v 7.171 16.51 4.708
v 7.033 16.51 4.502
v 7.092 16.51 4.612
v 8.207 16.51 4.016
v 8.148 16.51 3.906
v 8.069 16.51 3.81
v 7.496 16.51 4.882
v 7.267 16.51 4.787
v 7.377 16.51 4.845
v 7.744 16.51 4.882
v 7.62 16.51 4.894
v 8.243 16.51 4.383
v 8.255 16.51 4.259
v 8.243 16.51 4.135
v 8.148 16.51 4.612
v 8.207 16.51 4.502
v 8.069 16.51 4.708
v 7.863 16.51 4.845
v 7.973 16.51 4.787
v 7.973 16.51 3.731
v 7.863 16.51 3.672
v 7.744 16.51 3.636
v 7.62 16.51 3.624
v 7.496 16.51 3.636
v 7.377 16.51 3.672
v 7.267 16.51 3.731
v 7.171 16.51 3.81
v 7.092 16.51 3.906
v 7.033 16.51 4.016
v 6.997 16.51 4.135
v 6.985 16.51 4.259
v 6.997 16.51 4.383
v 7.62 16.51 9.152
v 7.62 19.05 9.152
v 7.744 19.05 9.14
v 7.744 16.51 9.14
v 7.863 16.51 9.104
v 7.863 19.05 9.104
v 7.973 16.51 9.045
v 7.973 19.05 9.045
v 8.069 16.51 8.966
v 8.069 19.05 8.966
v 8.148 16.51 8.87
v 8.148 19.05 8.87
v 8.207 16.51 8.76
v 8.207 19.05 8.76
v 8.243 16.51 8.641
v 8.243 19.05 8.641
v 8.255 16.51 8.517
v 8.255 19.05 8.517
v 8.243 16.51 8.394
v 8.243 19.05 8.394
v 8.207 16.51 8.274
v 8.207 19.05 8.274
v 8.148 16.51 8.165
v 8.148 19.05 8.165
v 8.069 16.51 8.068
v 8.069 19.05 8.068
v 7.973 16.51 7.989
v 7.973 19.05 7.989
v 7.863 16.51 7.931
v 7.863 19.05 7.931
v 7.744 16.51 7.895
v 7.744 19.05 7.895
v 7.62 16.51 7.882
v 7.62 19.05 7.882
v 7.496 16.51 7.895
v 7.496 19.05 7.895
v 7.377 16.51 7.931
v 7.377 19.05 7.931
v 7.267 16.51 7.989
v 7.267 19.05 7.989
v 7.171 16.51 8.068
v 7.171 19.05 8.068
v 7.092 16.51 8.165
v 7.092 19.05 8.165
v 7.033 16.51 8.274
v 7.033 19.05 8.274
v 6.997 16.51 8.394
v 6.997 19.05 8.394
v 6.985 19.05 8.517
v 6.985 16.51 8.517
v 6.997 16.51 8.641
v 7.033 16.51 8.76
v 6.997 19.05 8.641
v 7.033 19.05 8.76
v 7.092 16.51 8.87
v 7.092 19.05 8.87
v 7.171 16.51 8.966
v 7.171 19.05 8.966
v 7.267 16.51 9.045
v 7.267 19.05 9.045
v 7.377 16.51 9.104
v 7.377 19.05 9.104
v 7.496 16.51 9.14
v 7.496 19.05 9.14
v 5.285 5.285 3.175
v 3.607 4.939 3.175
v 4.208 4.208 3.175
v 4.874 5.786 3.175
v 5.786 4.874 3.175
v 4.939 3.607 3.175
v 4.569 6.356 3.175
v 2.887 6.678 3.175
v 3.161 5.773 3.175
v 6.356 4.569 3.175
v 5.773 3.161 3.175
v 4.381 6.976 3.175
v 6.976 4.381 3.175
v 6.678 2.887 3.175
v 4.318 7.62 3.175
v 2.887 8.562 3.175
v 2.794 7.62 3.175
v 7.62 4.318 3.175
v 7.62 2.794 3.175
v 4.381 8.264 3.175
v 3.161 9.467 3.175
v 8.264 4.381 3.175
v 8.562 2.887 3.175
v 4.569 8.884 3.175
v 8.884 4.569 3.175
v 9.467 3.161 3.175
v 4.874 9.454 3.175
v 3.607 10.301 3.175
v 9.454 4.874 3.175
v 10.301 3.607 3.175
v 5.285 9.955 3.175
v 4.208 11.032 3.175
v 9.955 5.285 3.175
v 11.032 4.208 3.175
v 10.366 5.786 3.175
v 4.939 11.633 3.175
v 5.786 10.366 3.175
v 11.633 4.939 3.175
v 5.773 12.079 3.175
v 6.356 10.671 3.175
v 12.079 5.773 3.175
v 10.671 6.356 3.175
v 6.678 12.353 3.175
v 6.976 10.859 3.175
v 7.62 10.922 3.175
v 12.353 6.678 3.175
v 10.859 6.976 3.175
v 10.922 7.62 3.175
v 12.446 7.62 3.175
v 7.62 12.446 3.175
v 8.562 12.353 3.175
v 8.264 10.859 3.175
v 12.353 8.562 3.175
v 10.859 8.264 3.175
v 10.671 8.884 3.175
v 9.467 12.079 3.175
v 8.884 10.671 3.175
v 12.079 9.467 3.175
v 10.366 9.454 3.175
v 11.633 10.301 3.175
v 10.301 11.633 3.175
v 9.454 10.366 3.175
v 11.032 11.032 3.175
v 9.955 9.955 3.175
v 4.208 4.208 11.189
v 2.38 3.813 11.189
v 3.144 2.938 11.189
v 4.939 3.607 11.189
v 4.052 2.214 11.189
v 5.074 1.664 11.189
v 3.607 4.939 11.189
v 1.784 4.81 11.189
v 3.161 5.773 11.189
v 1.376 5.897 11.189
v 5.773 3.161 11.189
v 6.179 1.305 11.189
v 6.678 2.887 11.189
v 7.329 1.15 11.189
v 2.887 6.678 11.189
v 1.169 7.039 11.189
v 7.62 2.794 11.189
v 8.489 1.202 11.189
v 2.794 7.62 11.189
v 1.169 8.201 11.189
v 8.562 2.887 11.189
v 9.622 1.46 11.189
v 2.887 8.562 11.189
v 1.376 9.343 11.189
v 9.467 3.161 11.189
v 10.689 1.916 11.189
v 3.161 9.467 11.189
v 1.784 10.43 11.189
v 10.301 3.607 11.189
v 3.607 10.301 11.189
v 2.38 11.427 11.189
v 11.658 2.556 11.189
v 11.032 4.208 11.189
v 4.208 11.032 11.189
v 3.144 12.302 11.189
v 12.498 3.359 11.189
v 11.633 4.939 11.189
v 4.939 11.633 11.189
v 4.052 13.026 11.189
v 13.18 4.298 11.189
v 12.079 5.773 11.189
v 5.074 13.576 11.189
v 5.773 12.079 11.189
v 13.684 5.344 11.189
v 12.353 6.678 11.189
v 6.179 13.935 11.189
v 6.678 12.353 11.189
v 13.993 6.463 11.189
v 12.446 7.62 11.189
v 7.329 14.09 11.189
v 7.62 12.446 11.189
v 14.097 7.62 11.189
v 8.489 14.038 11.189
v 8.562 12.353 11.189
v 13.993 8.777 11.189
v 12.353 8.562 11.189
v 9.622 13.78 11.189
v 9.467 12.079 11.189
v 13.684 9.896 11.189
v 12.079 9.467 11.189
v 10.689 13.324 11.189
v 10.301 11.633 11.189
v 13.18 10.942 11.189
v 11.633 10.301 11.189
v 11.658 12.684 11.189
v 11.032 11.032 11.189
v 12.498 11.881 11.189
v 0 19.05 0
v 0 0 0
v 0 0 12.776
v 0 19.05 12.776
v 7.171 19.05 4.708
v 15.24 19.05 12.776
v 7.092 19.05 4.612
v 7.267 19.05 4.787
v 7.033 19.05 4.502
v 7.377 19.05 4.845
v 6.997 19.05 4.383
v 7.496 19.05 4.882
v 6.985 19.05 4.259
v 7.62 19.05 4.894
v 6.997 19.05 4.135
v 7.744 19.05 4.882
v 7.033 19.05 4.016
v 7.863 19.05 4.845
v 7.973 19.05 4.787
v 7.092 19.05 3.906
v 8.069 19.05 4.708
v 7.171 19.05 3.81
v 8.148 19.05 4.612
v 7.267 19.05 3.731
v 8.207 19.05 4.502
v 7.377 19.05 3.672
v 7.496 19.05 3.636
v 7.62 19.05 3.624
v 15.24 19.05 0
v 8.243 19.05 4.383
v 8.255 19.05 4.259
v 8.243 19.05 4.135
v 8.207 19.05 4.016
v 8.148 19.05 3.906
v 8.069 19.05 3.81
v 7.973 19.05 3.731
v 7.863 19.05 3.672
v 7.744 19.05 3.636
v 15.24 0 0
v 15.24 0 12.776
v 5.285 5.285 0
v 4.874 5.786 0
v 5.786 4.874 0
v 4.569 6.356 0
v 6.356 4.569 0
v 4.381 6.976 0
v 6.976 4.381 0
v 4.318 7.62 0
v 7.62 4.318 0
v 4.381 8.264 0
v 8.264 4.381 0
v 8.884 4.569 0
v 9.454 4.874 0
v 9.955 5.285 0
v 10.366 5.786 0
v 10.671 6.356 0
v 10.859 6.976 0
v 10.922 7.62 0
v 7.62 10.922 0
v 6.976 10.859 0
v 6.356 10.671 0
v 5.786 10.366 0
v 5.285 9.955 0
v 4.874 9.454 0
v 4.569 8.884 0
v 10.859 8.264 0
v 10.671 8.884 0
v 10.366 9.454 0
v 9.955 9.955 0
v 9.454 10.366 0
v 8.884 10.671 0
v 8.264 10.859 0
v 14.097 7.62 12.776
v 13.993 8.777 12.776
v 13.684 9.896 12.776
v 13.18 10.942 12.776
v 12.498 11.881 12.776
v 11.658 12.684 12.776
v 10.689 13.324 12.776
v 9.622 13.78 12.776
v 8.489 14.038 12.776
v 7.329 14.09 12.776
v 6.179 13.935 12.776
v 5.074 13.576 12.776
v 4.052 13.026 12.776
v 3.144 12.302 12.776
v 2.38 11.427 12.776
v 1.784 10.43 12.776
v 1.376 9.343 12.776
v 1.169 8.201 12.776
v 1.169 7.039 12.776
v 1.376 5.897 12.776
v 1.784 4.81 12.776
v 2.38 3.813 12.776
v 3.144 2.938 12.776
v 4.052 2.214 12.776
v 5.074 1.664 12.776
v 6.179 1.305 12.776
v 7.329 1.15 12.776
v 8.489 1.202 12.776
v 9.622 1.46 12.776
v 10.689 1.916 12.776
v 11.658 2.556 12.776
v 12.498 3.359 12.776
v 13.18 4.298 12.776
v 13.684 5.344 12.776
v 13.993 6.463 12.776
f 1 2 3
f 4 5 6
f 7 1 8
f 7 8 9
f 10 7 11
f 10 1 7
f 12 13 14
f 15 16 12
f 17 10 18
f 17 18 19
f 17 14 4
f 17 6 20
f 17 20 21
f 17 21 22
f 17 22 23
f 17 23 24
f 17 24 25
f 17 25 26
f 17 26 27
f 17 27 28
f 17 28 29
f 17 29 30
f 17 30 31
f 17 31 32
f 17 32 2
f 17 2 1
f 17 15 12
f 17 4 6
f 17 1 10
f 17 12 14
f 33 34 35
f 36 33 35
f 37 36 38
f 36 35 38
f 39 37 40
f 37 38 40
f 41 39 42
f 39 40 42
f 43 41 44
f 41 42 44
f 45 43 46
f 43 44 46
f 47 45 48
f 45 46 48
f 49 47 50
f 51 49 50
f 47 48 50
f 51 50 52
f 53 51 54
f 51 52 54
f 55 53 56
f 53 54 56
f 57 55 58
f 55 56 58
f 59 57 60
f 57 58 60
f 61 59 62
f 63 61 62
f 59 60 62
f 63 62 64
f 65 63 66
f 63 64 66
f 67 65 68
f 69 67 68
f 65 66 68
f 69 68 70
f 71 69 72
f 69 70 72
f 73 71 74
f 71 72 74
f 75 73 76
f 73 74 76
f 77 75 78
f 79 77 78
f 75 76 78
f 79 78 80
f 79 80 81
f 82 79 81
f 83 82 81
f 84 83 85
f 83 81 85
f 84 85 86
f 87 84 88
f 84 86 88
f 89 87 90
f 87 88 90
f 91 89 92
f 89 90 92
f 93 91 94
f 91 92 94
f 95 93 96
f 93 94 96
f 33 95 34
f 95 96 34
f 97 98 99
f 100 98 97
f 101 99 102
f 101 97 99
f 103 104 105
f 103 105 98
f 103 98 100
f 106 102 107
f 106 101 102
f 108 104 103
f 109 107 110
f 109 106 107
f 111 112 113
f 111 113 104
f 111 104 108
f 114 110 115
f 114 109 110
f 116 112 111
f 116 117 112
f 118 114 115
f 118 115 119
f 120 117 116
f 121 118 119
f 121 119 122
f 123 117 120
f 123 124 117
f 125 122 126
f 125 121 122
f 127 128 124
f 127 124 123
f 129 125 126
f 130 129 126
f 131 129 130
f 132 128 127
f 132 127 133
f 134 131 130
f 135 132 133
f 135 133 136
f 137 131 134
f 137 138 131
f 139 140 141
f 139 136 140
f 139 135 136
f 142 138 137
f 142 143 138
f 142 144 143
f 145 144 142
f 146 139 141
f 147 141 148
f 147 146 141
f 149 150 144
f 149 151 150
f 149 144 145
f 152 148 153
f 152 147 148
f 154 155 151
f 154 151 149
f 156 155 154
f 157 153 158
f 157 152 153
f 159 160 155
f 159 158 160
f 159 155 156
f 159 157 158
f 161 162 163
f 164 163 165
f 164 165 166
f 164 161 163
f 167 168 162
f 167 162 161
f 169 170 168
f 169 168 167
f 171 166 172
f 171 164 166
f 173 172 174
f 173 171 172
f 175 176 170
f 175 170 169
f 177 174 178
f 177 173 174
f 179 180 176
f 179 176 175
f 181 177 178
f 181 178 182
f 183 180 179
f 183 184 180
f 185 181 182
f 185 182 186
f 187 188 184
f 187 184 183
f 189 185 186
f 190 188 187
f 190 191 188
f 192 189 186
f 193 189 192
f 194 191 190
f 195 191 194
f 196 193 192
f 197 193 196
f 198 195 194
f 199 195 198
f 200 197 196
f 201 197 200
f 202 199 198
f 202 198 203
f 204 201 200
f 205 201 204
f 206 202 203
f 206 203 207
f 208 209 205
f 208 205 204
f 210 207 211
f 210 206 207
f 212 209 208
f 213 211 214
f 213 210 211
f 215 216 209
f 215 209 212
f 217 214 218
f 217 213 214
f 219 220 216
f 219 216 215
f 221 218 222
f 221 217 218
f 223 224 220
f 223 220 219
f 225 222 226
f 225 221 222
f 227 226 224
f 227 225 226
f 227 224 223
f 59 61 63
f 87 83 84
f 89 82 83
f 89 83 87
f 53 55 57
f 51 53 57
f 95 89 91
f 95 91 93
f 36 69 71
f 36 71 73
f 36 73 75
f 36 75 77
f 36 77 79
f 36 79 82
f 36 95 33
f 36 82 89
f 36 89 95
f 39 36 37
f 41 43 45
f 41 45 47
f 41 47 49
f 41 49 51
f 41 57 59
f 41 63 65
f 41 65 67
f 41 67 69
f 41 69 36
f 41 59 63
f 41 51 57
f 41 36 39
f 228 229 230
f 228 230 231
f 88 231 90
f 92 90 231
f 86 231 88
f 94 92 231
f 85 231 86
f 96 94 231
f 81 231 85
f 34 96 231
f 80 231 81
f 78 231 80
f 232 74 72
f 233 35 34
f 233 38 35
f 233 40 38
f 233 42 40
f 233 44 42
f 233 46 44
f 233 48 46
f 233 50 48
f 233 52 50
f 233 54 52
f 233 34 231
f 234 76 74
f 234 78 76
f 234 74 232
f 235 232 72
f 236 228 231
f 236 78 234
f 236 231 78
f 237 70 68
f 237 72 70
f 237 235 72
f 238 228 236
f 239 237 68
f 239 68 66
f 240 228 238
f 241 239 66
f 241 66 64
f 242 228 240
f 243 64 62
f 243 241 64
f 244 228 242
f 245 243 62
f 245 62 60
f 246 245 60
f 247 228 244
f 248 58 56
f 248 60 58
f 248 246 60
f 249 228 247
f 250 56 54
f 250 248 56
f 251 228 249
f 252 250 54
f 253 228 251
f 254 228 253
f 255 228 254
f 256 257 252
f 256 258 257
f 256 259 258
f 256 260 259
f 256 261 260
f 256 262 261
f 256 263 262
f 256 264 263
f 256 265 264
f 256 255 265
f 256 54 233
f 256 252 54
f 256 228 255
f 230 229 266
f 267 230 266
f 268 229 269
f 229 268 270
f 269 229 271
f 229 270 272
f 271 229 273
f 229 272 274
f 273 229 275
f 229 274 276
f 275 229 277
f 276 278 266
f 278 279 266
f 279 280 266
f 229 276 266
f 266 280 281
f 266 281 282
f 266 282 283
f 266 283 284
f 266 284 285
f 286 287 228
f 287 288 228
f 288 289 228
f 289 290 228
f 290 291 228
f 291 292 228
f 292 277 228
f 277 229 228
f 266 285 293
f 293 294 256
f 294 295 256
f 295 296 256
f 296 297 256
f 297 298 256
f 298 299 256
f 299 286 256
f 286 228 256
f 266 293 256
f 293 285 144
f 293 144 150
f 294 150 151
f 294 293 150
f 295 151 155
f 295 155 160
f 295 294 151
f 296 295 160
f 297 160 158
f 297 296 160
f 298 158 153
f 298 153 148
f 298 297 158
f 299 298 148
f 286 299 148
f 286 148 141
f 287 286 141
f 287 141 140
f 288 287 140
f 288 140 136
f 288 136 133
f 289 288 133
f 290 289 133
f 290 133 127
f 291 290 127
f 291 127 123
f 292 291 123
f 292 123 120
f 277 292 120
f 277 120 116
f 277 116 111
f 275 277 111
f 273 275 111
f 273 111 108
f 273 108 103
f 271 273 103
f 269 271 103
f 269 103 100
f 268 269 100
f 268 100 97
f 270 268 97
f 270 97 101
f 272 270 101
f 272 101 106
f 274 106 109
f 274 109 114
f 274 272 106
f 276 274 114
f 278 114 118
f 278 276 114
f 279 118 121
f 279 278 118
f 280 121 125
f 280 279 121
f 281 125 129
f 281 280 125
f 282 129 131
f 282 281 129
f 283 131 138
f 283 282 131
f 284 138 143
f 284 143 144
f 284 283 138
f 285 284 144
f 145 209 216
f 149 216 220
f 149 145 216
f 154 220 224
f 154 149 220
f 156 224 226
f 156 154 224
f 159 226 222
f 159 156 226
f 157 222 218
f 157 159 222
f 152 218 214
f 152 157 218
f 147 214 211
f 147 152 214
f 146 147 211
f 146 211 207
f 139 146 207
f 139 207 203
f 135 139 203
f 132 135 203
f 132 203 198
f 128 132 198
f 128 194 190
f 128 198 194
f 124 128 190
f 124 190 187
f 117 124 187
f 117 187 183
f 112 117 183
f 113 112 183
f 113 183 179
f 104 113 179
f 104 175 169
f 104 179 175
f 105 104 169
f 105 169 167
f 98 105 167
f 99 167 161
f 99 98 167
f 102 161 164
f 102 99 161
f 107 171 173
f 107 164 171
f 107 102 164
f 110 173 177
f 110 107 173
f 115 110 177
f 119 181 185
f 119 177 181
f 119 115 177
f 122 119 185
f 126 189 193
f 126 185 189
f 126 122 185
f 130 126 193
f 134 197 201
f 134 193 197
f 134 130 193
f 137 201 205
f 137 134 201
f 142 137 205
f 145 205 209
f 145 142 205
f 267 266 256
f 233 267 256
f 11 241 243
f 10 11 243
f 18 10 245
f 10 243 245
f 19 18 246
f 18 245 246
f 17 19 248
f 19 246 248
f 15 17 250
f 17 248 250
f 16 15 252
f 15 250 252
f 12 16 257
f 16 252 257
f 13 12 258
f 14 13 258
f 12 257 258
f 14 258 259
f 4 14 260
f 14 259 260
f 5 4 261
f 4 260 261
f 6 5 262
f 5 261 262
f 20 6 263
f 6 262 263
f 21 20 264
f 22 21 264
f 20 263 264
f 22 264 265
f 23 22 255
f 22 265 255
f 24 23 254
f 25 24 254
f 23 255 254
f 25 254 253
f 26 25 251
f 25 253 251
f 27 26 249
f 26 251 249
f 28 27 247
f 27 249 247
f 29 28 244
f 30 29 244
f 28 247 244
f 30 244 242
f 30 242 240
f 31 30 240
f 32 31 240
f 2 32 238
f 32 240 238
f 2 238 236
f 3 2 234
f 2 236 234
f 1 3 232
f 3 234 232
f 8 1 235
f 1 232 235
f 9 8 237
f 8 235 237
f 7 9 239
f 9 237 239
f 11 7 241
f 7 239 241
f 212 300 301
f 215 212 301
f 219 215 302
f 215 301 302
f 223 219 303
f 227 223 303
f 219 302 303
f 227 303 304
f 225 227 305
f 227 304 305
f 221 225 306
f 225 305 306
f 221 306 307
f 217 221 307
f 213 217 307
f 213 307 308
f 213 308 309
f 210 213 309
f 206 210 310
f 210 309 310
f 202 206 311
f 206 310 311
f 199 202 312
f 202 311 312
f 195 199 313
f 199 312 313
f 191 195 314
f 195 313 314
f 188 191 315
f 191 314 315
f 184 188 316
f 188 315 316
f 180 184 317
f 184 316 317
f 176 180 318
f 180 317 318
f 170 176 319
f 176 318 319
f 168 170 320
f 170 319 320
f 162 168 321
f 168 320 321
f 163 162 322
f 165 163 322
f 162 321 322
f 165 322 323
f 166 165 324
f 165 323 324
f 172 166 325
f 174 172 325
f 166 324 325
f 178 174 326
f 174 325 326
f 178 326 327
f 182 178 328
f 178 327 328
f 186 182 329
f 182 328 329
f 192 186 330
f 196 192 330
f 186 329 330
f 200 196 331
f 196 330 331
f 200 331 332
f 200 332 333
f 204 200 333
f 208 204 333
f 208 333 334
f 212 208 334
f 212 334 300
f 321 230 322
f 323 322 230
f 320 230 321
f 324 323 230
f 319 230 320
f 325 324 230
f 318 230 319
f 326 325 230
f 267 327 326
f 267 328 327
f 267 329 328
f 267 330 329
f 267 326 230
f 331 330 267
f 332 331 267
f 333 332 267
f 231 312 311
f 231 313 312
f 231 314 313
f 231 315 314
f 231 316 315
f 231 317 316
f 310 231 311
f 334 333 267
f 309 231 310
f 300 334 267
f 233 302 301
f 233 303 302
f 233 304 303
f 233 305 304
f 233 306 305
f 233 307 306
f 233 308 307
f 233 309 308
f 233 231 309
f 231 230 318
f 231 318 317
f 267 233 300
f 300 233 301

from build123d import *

# Parameters (mm, degrees)
SKETCH1_W           = 15.24
SKETCH1_H           = 19.05
SKETCH1_R           = 3.302
BOSS_EXTRUDE1_DEPTH = 12.7762
CUT_EXTRUDE1_START  = -9.6012
SKETCH2_R           = 4.826
SKETCH2_R_2         = 3.302
CUT_EXTRUDE1_DEPTH  = 9.6012
SKETCH4_R           = 6.477
CUT_EXTRUDE4_DEPTH  = 1.5875
SKETCH5_R           = 0.635
CUT_EXTRUDE5_DEPTH  = 2.54


with BuildPart() as part:
    # Sketch1 → Boss-Extrude1 (new body)
    with BuildSketch(Plane.XY):
        with Locations((7.62, 9.525)):
            Rectangle(SKETCH1_W, SKETCH1_H)
        with Locations((7.62, 7.62)):
            Circle(SKETCH1_R, mode=Mode.SUBTRACT)
    extrude(amount=BOSS_EXTRUDE1_DEPTH)

    # Sketch2 → Cut-Extrude1 (cut)
    with BuildSketch(Plane.XY.offset(12.7762).offset(CUT_EXTRUDE1_START)):
        with Locations((7.62, 7.62)):
            Circle(SKETCH2_R)
        with Locations(Location((7.62, 7.62, 0), (0, 0, 180))):
            Circle(SKETCH2_R_2, mode=Mode.SUBTRACT)
    extrude(amount=CUT_EXTRUDE1_DEPTH, mode=Mode.SUBTRACT)

    # Sketch4 → Cut-Extrude4 (cut)
    with BuildSketch(Plane.XY.offset(12.7762)):
        with Locations((7.62, 7.62)):
            Circle(SKETCH4_R)
    extrude(amount=-CUT_EXTRUDE4_DEPTH, mode=Mode.SUBTRACT)

    # Sketch5 → Cut-Extrude5 (cut)
    with BuildSketch(Plane(origin=(0, 19.05, 0), x_dir=(1, 0, 0), z_dir=(0, 1, 0))):
        with Locations(Location((7.62, -8.517466667, 0), (0, 0, 270))):
            Circle(SKETCH5_R)
        with Locations(Location((7.62, -4.258733333, 0), (0, 0, 270))):
            Circle(SKETCH5_R)
    extrude(amount=-CUT_EXTRUDE5_DEPTH, mode=Mode.SUBTRACT)


solid = part.part
